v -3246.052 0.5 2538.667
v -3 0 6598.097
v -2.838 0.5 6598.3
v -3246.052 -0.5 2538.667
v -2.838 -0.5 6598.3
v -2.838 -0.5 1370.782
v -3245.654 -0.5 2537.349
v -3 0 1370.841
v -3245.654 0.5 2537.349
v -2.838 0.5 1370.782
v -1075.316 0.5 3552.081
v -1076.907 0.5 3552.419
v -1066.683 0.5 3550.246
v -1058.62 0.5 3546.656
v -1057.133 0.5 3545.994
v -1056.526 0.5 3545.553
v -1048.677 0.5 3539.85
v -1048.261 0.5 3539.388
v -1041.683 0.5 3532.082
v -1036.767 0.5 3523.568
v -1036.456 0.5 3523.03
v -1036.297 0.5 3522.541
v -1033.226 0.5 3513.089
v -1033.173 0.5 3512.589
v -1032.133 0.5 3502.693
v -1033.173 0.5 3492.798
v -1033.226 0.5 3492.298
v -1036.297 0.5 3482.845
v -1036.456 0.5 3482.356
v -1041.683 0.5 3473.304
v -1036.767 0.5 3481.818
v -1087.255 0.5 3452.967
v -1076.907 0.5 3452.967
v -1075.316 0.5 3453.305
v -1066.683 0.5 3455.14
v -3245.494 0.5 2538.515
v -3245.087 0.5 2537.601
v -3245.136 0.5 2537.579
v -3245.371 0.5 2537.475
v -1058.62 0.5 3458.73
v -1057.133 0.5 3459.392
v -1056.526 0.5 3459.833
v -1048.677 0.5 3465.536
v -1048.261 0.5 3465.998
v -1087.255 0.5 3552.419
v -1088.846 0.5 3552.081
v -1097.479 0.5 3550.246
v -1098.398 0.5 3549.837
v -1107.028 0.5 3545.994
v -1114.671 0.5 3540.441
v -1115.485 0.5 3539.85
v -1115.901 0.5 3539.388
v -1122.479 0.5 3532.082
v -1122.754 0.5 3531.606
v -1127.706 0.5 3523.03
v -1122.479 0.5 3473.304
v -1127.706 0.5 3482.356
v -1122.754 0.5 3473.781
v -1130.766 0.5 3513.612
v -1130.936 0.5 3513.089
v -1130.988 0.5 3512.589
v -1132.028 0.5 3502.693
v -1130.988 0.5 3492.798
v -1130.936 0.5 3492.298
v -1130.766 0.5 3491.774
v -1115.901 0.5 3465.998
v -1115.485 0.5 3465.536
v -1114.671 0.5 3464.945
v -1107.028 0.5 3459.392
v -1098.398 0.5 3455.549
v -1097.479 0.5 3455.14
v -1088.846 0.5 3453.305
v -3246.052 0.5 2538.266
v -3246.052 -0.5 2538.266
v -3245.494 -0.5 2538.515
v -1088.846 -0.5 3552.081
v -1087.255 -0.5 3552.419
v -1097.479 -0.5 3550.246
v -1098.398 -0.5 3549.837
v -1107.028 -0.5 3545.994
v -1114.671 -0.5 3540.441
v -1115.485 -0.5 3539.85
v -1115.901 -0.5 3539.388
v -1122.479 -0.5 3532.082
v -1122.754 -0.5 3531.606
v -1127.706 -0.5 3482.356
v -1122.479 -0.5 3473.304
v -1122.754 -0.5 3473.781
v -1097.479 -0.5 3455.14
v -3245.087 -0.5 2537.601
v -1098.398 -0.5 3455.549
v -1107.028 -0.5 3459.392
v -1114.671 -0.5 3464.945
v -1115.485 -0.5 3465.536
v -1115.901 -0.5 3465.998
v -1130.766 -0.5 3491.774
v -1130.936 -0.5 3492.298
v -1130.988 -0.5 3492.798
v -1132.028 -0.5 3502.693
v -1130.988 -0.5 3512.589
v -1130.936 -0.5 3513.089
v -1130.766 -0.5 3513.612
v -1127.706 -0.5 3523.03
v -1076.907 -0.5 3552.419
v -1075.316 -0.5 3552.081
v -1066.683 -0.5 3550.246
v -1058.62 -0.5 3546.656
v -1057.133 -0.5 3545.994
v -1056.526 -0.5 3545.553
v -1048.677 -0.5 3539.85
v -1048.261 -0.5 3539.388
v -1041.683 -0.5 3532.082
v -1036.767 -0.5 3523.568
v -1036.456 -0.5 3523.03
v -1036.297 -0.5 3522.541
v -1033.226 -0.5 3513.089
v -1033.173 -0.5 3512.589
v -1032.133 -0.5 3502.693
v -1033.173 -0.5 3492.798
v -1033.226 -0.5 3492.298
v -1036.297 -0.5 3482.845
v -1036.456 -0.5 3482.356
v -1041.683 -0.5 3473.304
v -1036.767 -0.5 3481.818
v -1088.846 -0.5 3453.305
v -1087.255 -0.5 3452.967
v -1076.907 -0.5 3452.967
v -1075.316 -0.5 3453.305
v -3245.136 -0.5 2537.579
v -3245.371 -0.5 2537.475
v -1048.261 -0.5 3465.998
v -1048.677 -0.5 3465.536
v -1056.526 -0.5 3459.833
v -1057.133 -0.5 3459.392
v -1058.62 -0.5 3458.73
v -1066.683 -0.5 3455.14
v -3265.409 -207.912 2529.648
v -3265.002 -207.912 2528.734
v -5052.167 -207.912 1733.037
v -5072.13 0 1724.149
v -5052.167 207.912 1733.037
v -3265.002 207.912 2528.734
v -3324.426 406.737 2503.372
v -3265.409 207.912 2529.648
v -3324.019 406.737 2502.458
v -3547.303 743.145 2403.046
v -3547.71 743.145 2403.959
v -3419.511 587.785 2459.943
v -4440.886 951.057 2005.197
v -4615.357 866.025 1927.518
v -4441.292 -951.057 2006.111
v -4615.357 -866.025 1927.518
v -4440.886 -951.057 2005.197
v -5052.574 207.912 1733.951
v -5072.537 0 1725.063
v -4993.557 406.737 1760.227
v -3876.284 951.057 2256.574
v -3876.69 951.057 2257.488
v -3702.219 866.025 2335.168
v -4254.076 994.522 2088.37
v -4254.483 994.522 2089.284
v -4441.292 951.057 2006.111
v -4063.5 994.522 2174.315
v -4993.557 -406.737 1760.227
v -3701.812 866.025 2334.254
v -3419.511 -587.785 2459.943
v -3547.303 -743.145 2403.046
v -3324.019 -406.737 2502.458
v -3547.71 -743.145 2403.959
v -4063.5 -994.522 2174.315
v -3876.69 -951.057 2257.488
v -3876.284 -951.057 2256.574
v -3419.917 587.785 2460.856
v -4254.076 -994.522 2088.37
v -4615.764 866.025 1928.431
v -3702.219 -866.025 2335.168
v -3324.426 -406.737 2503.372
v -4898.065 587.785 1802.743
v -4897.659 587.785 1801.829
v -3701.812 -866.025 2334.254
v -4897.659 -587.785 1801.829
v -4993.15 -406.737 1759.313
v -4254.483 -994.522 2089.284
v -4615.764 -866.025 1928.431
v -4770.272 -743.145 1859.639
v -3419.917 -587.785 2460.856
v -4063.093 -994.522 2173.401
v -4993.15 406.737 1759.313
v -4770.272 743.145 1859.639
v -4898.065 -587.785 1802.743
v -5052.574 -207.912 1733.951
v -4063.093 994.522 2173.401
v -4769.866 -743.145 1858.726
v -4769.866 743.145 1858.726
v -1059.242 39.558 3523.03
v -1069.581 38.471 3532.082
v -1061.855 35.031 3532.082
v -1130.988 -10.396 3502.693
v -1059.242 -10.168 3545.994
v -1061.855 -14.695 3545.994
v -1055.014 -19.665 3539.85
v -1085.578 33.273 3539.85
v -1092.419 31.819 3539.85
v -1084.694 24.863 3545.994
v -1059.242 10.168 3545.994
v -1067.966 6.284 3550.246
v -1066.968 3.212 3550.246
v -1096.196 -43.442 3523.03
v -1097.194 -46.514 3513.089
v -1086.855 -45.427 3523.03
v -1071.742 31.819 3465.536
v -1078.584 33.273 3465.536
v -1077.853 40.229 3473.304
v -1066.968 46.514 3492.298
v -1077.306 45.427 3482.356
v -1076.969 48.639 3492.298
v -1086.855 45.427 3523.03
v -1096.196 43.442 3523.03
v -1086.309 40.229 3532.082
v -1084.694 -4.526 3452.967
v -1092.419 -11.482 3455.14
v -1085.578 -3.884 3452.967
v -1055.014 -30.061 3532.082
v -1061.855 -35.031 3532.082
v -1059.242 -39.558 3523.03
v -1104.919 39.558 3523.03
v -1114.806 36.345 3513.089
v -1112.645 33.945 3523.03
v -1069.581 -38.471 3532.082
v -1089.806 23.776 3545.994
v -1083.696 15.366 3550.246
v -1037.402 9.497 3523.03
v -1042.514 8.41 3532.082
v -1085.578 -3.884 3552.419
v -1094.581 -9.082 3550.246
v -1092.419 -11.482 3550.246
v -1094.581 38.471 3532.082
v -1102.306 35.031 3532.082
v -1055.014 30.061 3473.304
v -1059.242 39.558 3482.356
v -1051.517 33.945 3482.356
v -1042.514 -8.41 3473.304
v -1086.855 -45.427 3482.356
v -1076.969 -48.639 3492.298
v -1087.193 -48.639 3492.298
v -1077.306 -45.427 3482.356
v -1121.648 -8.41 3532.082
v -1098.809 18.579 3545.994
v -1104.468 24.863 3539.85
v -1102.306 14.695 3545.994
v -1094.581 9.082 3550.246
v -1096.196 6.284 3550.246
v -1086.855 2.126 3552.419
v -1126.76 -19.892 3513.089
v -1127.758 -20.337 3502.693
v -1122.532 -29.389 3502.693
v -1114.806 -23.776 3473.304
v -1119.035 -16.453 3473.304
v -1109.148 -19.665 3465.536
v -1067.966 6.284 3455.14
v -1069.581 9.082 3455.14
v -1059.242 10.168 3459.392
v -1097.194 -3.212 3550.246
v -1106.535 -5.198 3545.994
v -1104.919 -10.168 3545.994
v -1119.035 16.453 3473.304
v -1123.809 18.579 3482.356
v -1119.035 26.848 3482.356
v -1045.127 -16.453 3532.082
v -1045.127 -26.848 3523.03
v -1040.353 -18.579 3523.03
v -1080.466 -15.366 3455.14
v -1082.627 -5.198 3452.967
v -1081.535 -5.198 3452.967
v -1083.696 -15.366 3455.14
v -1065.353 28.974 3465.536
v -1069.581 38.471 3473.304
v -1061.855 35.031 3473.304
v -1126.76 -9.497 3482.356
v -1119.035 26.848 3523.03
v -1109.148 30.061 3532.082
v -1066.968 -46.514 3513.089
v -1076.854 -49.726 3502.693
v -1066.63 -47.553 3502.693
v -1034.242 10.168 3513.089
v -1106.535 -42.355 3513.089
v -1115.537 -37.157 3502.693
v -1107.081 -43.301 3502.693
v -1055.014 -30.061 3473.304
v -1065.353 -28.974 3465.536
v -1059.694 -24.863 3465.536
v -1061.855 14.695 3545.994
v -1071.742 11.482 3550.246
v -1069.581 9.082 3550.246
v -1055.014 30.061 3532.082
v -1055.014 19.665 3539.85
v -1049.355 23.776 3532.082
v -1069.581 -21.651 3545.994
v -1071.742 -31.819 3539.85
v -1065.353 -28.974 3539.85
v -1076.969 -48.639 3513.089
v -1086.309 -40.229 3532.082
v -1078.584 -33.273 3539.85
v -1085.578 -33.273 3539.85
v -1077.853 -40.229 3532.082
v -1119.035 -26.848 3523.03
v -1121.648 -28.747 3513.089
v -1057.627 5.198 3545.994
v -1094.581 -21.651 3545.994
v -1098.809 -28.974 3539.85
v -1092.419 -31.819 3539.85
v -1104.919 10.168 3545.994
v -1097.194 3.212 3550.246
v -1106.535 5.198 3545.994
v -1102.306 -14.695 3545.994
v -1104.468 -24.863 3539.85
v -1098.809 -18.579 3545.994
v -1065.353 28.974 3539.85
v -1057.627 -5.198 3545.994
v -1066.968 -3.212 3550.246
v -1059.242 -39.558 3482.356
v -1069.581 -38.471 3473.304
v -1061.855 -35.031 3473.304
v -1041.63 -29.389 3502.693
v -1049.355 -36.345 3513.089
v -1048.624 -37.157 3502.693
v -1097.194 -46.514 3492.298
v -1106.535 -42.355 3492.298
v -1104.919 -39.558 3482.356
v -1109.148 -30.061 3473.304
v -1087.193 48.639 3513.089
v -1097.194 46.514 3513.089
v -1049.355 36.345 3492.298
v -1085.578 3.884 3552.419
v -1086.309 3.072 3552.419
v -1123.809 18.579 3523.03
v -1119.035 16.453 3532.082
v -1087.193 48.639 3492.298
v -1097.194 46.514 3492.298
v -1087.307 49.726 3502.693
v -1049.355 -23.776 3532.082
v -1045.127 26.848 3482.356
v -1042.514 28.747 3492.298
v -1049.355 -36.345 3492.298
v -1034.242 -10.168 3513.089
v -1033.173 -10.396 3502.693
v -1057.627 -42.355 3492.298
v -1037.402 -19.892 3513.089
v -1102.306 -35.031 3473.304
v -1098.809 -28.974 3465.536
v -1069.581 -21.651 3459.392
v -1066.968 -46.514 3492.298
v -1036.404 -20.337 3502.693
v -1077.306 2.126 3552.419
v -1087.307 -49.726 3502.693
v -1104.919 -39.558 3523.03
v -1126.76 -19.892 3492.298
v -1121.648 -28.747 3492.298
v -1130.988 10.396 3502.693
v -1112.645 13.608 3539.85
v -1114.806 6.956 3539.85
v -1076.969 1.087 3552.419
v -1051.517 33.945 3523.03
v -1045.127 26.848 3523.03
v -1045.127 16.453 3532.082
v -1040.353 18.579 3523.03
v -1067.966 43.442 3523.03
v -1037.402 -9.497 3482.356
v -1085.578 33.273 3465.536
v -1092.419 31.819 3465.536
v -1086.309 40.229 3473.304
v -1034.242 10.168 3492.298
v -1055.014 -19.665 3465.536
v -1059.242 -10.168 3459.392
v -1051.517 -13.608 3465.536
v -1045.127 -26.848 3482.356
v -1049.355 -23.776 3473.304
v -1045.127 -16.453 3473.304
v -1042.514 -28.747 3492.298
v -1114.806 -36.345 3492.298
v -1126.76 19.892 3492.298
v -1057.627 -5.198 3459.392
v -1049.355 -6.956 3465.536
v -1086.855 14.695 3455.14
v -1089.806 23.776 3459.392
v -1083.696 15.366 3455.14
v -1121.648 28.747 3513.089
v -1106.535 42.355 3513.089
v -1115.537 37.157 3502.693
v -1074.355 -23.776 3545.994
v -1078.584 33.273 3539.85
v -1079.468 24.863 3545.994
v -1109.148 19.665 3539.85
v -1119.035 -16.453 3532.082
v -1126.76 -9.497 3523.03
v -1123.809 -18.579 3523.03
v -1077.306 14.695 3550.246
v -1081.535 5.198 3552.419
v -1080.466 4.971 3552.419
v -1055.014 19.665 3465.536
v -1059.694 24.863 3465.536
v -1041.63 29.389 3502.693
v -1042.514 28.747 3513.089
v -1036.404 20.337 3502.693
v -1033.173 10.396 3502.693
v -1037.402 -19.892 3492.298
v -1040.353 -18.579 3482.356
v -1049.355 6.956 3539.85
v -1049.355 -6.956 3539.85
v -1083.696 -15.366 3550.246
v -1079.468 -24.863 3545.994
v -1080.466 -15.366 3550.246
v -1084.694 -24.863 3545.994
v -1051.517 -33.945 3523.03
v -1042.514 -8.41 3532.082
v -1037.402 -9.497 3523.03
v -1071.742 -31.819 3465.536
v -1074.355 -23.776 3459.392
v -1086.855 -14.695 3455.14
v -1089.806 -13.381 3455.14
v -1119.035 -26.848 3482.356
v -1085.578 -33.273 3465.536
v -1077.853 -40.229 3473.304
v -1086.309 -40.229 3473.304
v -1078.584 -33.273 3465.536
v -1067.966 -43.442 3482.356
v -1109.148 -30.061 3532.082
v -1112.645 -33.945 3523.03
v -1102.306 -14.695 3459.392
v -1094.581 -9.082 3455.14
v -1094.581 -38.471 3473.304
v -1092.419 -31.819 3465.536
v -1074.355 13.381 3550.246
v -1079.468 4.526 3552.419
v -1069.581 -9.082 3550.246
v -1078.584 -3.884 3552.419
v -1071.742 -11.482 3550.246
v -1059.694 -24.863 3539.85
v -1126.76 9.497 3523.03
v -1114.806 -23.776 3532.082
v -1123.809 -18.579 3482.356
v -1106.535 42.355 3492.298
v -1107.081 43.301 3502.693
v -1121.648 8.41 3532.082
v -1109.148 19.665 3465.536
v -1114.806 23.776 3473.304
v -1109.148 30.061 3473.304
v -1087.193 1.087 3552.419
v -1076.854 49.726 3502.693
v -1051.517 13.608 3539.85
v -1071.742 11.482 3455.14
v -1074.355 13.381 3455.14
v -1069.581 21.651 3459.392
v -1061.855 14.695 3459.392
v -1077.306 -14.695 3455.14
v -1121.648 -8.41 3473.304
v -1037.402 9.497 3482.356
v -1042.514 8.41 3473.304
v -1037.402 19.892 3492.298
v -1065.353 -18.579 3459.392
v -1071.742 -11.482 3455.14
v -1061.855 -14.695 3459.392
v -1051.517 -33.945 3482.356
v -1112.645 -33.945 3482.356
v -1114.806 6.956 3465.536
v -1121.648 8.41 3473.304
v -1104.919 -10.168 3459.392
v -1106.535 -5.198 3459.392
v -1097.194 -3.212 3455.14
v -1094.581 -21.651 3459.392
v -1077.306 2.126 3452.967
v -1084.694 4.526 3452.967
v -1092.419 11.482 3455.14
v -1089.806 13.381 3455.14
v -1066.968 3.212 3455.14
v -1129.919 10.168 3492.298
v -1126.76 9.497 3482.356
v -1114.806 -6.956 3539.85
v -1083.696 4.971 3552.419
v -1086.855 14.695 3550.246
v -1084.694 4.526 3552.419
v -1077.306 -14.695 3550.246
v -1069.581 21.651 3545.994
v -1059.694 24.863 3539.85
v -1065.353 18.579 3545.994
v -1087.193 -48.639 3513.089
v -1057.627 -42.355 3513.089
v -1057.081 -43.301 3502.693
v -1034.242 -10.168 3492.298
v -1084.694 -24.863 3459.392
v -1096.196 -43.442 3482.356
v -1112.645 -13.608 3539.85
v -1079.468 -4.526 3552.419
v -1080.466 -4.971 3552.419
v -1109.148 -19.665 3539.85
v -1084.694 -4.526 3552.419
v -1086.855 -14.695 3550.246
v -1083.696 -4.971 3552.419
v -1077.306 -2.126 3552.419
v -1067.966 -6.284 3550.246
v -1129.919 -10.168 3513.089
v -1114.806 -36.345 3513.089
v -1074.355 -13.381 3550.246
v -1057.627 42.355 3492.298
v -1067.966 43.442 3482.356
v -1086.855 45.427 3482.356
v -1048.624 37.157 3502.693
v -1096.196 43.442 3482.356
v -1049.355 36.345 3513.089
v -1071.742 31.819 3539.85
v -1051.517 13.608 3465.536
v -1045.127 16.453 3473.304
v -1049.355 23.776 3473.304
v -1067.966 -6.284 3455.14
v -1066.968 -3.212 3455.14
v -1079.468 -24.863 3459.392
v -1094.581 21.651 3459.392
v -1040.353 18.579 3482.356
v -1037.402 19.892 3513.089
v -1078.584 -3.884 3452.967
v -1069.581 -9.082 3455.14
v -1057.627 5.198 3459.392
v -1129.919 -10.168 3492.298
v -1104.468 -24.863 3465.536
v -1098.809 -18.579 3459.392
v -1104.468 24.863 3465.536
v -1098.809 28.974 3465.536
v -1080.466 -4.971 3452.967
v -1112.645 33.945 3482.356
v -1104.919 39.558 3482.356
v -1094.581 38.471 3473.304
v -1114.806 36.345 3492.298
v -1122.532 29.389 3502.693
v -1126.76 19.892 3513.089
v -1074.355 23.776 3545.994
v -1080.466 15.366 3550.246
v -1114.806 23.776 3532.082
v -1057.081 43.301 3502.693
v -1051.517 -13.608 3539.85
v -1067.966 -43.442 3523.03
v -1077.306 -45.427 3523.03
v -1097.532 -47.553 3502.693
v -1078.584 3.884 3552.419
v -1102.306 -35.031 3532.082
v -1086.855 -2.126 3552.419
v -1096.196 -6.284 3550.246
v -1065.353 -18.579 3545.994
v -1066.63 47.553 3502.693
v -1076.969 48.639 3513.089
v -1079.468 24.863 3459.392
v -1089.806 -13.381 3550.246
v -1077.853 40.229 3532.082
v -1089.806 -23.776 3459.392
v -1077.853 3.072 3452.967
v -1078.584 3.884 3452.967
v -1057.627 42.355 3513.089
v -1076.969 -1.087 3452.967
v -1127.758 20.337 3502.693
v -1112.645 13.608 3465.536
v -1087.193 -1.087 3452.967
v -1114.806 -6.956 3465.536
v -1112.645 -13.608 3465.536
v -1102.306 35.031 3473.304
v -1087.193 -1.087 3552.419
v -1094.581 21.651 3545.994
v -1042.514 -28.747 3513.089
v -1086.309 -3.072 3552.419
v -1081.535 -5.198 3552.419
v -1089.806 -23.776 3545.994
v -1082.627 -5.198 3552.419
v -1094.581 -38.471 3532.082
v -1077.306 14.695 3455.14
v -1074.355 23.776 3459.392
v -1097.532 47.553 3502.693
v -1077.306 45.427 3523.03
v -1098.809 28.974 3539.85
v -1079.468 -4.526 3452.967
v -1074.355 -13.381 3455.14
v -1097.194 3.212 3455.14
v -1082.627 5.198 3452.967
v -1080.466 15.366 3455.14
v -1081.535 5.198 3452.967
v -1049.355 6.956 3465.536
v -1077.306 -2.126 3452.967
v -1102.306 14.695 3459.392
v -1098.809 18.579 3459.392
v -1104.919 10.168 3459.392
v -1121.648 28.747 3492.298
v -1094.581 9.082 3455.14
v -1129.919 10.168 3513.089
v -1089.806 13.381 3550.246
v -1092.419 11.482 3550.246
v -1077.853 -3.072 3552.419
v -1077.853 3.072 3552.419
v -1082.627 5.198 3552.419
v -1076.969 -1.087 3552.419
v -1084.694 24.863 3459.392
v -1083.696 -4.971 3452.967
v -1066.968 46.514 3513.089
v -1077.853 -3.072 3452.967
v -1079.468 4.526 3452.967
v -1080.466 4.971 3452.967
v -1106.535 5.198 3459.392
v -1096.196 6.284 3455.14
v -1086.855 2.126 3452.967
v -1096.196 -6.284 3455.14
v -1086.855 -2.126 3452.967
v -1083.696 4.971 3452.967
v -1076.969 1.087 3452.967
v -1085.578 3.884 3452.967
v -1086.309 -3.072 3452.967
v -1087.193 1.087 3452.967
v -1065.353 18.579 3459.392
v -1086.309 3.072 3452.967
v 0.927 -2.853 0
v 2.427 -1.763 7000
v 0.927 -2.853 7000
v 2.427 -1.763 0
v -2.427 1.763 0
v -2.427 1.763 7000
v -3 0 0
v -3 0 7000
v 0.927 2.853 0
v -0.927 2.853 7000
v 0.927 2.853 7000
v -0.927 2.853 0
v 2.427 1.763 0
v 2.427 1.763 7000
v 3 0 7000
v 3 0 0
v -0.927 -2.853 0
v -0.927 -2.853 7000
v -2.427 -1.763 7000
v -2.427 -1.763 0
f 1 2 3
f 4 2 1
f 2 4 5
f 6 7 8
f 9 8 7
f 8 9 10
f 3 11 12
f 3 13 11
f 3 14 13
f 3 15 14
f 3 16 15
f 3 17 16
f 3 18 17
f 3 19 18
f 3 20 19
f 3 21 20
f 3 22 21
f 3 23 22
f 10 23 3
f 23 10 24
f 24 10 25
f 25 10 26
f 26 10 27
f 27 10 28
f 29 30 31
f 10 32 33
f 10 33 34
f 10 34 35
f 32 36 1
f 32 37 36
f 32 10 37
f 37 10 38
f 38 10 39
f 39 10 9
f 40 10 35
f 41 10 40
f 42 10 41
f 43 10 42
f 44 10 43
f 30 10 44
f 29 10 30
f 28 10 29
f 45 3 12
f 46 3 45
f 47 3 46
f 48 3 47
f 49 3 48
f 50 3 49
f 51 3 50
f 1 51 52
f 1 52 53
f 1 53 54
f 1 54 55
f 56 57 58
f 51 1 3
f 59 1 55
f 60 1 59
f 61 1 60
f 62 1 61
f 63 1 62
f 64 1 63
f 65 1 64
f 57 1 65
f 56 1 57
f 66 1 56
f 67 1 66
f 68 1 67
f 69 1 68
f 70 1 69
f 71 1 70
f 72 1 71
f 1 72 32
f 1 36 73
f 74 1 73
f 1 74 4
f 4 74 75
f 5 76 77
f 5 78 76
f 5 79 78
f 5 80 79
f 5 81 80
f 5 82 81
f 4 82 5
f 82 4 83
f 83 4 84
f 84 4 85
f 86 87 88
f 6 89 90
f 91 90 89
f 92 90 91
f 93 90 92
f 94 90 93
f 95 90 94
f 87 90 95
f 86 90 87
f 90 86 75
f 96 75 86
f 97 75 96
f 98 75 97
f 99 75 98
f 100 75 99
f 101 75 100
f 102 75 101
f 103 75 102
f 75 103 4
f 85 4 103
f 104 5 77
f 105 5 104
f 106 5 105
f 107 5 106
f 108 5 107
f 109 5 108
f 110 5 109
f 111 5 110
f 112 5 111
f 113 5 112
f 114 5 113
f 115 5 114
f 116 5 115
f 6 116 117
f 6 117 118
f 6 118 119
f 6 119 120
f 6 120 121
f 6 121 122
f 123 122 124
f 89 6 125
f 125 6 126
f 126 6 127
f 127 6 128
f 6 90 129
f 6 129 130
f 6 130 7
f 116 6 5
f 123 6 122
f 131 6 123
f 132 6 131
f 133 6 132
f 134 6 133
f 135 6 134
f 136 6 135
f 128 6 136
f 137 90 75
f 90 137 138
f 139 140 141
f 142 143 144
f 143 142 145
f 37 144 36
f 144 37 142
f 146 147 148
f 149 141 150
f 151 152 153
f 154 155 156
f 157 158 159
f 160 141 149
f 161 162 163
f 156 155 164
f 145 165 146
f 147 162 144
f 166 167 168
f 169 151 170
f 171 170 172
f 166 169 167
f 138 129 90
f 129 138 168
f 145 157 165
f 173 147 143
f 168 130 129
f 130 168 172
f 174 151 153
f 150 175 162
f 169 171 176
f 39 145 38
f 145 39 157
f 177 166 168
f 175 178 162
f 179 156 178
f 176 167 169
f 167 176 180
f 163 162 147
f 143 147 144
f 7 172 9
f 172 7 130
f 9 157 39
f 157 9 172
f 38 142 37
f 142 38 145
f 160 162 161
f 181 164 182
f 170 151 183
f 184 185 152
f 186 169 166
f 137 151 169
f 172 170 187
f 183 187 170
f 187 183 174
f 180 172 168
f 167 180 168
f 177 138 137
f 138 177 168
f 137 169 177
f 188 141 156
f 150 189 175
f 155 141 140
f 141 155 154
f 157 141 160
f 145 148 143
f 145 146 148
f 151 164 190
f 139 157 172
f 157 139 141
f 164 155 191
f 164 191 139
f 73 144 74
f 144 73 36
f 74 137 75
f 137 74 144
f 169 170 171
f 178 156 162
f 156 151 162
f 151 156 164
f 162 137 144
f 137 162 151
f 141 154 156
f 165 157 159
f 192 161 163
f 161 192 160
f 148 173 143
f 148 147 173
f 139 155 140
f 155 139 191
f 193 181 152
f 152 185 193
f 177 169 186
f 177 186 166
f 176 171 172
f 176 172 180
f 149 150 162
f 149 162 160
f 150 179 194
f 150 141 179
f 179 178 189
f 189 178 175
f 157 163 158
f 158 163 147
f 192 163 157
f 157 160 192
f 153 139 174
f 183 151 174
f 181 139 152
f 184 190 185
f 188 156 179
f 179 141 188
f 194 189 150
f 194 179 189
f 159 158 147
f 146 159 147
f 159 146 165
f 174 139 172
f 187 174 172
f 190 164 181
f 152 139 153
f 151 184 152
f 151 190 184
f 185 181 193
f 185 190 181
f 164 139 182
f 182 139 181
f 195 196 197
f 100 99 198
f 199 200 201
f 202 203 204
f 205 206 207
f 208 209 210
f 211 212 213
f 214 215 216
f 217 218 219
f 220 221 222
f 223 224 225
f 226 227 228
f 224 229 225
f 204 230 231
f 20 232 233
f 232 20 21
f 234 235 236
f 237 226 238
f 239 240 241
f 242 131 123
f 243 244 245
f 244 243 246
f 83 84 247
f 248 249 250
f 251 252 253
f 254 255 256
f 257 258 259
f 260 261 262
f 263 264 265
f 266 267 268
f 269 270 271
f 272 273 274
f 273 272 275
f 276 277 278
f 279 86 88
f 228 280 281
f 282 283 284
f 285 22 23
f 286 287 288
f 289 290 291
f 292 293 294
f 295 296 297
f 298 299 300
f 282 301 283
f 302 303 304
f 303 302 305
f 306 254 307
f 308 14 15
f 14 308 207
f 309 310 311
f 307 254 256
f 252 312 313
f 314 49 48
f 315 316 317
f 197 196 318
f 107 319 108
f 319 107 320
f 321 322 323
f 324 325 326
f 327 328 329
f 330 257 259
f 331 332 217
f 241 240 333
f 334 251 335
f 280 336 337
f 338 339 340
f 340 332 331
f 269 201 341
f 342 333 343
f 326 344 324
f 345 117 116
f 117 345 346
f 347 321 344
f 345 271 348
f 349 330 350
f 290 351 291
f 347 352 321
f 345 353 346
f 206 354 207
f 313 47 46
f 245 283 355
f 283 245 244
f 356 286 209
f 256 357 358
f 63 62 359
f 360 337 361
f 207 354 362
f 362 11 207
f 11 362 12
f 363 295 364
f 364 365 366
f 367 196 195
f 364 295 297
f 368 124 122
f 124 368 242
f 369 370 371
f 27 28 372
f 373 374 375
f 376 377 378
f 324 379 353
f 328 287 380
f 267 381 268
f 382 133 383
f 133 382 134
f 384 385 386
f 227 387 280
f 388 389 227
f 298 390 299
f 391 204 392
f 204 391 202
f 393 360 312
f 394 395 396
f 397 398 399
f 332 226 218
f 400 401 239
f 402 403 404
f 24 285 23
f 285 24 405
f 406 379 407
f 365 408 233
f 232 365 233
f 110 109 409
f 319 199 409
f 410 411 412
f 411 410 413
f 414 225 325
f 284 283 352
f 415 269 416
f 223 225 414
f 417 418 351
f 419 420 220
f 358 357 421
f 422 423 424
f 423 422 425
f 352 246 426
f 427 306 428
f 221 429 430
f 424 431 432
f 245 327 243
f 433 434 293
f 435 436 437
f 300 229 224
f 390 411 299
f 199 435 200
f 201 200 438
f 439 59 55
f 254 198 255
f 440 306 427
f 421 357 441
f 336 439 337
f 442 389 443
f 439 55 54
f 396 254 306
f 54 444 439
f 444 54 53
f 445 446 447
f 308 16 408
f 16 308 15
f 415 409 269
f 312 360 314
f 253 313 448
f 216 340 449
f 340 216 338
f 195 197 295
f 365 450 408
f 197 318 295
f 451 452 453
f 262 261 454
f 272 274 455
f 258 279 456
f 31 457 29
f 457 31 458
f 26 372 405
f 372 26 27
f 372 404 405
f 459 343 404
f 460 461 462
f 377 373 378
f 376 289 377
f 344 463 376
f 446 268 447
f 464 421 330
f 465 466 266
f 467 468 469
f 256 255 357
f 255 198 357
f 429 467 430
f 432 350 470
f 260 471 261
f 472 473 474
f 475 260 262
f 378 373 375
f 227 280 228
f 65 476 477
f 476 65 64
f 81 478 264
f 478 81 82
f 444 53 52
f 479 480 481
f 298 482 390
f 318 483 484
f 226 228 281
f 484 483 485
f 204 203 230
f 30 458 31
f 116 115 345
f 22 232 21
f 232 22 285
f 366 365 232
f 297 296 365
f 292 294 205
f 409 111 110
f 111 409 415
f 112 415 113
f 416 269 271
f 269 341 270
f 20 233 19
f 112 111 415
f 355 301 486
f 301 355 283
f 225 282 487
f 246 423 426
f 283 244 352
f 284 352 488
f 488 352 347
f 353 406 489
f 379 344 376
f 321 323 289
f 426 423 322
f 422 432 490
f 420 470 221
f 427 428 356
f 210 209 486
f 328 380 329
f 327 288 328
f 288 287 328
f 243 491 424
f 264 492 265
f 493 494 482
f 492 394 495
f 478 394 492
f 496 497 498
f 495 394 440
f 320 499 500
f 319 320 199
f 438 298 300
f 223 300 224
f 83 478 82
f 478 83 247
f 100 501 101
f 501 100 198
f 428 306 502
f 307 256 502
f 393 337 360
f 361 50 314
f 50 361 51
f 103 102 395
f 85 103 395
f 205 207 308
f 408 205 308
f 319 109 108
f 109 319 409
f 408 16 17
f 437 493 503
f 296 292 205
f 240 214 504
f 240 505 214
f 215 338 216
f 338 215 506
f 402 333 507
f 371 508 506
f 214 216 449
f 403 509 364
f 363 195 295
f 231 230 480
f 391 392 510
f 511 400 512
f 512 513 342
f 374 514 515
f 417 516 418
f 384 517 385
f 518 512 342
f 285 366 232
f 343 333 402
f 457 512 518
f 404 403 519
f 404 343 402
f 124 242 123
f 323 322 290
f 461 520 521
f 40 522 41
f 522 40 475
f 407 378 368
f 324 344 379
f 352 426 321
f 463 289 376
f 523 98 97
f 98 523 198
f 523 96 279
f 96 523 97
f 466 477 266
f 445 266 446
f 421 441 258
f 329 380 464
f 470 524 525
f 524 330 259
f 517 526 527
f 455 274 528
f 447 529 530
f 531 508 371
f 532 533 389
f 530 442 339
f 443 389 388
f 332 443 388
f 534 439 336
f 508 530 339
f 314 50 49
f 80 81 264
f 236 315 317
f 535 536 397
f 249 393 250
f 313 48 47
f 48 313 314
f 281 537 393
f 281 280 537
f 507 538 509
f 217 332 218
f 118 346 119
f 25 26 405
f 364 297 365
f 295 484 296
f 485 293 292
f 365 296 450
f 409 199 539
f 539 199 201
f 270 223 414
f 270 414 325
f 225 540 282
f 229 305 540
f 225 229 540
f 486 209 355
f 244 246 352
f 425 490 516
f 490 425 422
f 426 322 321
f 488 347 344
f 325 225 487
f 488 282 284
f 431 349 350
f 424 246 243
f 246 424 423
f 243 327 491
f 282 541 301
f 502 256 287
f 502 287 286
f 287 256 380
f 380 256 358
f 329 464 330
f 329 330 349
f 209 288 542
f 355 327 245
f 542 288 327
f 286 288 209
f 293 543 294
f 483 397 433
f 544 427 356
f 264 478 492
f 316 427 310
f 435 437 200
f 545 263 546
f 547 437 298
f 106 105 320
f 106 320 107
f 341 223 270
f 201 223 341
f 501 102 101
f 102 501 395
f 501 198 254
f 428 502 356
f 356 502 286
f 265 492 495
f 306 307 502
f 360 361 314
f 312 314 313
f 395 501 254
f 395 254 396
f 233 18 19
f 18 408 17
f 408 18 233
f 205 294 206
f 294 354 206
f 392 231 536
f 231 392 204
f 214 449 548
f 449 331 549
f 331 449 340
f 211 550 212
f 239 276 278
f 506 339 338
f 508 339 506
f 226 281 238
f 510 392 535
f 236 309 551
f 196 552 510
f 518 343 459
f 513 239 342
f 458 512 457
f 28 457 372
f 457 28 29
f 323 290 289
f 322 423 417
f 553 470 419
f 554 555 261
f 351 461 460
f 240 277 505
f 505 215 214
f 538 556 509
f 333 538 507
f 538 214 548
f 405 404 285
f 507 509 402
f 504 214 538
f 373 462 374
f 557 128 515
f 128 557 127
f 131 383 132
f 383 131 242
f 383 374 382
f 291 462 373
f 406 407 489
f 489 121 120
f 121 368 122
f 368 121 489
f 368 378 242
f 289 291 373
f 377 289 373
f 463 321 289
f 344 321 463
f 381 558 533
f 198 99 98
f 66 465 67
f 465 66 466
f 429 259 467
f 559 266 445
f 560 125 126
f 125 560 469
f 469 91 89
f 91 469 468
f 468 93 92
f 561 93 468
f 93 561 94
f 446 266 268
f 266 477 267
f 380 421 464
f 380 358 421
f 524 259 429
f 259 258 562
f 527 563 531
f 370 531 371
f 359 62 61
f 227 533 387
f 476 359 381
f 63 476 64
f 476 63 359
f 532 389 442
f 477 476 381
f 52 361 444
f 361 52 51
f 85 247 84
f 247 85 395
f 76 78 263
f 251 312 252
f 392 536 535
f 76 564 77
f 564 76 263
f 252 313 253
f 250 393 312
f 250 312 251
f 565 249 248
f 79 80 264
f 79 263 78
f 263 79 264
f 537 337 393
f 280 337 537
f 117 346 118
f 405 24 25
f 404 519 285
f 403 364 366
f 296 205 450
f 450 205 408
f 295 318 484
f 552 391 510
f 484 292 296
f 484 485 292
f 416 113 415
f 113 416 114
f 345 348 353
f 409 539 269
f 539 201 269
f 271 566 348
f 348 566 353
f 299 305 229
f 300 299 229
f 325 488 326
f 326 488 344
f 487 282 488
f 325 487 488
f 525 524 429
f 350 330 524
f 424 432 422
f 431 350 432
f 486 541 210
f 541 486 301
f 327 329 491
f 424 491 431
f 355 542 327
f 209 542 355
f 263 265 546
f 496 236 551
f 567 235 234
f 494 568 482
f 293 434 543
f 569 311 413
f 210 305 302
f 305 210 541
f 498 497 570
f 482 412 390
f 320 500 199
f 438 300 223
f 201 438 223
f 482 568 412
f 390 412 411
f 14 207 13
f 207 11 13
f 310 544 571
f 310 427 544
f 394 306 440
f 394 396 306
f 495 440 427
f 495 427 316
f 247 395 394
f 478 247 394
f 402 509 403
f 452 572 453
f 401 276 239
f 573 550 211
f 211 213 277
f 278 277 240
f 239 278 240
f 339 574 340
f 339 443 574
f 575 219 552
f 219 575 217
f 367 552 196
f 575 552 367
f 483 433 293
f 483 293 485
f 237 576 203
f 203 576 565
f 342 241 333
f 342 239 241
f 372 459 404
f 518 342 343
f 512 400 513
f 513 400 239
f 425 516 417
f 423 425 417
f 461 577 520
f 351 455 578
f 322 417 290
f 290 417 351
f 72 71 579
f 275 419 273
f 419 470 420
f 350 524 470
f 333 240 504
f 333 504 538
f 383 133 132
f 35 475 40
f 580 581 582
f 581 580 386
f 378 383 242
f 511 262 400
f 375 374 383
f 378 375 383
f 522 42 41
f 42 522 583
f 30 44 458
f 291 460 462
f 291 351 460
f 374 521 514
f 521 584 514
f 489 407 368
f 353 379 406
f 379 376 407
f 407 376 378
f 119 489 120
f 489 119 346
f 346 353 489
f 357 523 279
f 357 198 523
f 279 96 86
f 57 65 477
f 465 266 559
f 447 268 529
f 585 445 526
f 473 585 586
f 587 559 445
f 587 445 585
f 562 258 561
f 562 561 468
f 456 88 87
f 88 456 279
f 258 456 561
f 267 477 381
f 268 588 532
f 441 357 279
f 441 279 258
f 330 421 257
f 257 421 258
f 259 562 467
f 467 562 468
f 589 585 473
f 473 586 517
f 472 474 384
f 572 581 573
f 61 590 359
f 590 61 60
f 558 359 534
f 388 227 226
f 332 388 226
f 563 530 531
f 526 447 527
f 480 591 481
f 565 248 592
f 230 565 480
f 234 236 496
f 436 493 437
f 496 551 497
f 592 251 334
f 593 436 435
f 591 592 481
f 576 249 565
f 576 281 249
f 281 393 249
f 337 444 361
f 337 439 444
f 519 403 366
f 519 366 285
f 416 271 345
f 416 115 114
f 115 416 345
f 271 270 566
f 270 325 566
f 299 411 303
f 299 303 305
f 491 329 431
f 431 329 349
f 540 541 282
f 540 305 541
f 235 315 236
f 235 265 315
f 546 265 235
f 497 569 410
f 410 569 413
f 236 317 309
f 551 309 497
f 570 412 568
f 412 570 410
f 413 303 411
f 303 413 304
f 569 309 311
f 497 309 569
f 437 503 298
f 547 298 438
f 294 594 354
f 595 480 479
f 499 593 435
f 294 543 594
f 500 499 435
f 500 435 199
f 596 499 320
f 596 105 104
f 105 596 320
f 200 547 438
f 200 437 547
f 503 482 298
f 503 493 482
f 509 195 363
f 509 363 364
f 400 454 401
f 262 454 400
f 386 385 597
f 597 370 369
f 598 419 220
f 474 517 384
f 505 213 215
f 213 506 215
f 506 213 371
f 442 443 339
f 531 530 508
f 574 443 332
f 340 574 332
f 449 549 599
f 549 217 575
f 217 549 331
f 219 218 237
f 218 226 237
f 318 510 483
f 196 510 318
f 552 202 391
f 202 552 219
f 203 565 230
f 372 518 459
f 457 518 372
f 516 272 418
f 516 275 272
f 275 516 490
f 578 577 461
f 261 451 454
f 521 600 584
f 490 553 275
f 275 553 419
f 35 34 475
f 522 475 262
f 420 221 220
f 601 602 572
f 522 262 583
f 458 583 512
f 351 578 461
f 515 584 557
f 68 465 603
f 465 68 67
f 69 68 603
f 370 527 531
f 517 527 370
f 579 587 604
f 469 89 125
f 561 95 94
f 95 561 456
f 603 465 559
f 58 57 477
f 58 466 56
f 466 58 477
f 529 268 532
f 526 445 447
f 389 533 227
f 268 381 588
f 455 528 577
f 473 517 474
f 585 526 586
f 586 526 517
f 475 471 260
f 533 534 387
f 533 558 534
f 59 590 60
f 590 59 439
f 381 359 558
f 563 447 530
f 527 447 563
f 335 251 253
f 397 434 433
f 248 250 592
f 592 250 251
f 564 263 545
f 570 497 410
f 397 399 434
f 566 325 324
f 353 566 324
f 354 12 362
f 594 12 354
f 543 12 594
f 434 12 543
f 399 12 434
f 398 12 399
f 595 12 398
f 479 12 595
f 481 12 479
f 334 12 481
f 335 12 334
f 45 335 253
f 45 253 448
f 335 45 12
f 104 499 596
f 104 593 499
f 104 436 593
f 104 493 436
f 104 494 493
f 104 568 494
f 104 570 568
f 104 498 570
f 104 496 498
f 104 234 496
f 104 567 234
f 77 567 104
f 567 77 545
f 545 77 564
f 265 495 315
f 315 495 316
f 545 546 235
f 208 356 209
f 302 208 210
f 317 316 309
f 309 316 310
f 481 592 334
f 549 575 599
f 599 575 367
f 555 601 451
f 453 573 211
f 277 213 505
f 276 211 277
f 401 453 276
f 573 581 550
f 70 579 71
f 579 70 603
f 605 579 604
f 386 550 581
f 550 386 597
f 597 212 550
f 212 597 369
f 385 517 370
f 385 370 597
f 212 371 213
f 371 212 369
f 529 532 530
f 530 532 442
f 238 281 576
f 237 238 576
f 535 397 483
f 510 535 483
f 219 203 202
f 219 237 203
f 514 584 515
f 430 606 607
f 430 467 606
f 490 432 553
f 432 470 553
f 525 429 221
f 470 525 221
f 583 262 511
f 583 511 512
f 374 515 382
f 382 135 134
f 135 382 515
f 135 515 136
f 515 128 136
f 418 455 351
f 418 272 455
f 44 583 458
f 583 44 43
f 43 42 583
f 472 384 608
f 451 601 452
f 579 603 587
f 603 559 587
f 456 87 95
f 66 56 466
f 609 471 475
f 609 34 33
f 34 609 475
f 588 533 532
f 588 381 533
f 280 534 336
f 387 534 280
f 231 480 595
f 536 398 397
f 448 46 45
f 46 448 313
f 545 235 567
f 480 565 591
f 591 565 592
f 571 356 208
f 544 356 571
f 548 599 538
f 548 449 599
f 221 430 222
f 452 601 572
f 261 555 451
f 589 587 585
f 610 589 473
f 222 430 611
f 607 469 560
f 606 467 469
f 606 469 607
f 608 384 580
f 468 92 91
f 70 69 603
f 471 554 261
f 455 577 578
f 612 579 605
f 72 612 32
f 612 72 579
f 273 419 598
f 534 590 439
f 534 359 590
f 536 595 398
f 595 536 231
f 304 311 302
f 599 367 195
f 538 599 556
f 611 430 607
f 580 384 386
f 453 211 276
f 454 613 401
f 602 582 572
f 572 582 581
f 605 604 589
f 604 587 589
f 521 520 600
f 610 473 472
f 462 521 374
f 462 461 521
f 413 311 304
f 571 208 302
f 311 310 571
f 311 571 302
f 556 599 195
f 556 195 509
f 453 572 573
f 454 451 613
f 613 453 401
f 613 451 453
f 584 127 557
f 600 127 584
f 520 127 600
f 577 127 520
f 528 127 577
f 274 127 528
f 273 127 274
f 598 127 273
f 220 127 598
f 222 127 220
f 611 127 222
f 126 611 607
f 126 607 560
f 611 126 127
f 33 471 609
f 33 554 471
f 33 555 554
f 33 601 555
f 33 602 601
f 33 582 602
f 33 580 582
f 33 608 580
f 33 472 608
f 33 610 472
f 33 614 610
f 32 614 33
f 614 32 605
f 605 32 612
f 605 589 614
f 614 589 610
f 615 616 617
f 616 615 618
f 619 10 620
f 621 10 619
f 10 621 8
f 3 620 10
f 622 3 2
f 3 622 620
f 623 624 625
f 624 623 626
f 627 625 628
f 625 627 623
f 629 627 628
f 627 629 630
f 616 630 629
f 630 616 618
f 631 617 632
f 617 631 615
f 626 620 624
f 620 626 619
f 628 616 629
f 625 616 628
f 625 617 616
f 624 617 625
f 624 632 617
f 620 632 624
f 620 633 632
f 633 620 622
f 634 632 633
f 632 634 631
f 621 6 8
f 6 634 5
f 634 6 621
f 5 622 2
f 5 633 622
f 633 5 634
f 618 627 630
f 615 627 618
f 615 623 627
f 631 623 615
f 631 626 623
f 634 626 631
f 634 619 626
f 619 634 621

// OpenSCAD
// file: el_gen_shtag.scad
diamGenShtag = 6;

//translate([-2000,0,0]) 
GenShtag(7570);

module GenShtag(shtagLen) {
   translate([shtagLen/2, 0, 0]) rotate([0,90,0]) cylinder(h=shtagLen, d=diamGenShtag, center=true);       
}
// main file
use <el_gen_shtag.scad>;


perShkat = 5230;
betta = 70.21;
nizhShkat = 3450;
mediGamma = 24;

aX = nizhShkat*sin(betta);
aZ = nizhShkat*cos(betta);
// echo( "aX = ", aX); // 3246
// echo( "aZ = ", aZ); //1168 
// Пузо 4%

cpX = aX/3;
cpZ = aZ/3 + perShkat/3;

//d1 = 500;

// echo("area = ", perShkat*aX/2 * (1/1000000)); // 8.5 кв м

// высота паруса
// echo (" h = " , perShkat * sin(betta)); // 4921


GollandecGenoa(7000, 400);

/* Упрощение!!! */


module GollandecGenoa(gShtagLen, gShtagOffset) {
    
//    rotate([ 0 , betta - 90 , 0 ])
 //   rotate([ 0 , 0 , -15 ])
  //  translate([ 0 , 0 , -perShkat-250  ])
//    {

  //  translate([ 0 , 0 , -600 ])
  //  cylinder( h = perShkat + 1000 , d = 4 );


  translate([ 0 , 0 , gShtagLen ]) {
      
    rotate([ 0 , +90 , 0 ])
    GenShtag(gShtagLen);


    translate([ 0 , 0 ,-perShkat -gShtagOffset ]) {




    hull() {

        //C 
        translate([ -1 , 0 , perShkat - 1 ])
        rotate([ 90 , 0 , 0 ])
        cylinder( h = 1, r = 1 , center=true );

        //B
        translate([ -1 , 0 , 1 ])
        rotate([ 90 , 0 , 0 ])
        cylinder( h = 1, r = 1 , center=true );

        //A
        translate([ 1 - aX , 0 , aZ ])
        rotate([ 90 , 0 , 0 ])
        cylinder( h = 1, r = 1 , center=true );

    }


    translate([ 1 - aX , 0 , aZ ])
    rotate([ 0 , -mediGamma , 0 ])
    translate([ -1000 , 0 , 0 ])
    cylinder( h = 1, r = 1000 , center=true );

    translate([ -cpX , 0 , cpZ ])
    sphere( r = 50 );
    }}
}
